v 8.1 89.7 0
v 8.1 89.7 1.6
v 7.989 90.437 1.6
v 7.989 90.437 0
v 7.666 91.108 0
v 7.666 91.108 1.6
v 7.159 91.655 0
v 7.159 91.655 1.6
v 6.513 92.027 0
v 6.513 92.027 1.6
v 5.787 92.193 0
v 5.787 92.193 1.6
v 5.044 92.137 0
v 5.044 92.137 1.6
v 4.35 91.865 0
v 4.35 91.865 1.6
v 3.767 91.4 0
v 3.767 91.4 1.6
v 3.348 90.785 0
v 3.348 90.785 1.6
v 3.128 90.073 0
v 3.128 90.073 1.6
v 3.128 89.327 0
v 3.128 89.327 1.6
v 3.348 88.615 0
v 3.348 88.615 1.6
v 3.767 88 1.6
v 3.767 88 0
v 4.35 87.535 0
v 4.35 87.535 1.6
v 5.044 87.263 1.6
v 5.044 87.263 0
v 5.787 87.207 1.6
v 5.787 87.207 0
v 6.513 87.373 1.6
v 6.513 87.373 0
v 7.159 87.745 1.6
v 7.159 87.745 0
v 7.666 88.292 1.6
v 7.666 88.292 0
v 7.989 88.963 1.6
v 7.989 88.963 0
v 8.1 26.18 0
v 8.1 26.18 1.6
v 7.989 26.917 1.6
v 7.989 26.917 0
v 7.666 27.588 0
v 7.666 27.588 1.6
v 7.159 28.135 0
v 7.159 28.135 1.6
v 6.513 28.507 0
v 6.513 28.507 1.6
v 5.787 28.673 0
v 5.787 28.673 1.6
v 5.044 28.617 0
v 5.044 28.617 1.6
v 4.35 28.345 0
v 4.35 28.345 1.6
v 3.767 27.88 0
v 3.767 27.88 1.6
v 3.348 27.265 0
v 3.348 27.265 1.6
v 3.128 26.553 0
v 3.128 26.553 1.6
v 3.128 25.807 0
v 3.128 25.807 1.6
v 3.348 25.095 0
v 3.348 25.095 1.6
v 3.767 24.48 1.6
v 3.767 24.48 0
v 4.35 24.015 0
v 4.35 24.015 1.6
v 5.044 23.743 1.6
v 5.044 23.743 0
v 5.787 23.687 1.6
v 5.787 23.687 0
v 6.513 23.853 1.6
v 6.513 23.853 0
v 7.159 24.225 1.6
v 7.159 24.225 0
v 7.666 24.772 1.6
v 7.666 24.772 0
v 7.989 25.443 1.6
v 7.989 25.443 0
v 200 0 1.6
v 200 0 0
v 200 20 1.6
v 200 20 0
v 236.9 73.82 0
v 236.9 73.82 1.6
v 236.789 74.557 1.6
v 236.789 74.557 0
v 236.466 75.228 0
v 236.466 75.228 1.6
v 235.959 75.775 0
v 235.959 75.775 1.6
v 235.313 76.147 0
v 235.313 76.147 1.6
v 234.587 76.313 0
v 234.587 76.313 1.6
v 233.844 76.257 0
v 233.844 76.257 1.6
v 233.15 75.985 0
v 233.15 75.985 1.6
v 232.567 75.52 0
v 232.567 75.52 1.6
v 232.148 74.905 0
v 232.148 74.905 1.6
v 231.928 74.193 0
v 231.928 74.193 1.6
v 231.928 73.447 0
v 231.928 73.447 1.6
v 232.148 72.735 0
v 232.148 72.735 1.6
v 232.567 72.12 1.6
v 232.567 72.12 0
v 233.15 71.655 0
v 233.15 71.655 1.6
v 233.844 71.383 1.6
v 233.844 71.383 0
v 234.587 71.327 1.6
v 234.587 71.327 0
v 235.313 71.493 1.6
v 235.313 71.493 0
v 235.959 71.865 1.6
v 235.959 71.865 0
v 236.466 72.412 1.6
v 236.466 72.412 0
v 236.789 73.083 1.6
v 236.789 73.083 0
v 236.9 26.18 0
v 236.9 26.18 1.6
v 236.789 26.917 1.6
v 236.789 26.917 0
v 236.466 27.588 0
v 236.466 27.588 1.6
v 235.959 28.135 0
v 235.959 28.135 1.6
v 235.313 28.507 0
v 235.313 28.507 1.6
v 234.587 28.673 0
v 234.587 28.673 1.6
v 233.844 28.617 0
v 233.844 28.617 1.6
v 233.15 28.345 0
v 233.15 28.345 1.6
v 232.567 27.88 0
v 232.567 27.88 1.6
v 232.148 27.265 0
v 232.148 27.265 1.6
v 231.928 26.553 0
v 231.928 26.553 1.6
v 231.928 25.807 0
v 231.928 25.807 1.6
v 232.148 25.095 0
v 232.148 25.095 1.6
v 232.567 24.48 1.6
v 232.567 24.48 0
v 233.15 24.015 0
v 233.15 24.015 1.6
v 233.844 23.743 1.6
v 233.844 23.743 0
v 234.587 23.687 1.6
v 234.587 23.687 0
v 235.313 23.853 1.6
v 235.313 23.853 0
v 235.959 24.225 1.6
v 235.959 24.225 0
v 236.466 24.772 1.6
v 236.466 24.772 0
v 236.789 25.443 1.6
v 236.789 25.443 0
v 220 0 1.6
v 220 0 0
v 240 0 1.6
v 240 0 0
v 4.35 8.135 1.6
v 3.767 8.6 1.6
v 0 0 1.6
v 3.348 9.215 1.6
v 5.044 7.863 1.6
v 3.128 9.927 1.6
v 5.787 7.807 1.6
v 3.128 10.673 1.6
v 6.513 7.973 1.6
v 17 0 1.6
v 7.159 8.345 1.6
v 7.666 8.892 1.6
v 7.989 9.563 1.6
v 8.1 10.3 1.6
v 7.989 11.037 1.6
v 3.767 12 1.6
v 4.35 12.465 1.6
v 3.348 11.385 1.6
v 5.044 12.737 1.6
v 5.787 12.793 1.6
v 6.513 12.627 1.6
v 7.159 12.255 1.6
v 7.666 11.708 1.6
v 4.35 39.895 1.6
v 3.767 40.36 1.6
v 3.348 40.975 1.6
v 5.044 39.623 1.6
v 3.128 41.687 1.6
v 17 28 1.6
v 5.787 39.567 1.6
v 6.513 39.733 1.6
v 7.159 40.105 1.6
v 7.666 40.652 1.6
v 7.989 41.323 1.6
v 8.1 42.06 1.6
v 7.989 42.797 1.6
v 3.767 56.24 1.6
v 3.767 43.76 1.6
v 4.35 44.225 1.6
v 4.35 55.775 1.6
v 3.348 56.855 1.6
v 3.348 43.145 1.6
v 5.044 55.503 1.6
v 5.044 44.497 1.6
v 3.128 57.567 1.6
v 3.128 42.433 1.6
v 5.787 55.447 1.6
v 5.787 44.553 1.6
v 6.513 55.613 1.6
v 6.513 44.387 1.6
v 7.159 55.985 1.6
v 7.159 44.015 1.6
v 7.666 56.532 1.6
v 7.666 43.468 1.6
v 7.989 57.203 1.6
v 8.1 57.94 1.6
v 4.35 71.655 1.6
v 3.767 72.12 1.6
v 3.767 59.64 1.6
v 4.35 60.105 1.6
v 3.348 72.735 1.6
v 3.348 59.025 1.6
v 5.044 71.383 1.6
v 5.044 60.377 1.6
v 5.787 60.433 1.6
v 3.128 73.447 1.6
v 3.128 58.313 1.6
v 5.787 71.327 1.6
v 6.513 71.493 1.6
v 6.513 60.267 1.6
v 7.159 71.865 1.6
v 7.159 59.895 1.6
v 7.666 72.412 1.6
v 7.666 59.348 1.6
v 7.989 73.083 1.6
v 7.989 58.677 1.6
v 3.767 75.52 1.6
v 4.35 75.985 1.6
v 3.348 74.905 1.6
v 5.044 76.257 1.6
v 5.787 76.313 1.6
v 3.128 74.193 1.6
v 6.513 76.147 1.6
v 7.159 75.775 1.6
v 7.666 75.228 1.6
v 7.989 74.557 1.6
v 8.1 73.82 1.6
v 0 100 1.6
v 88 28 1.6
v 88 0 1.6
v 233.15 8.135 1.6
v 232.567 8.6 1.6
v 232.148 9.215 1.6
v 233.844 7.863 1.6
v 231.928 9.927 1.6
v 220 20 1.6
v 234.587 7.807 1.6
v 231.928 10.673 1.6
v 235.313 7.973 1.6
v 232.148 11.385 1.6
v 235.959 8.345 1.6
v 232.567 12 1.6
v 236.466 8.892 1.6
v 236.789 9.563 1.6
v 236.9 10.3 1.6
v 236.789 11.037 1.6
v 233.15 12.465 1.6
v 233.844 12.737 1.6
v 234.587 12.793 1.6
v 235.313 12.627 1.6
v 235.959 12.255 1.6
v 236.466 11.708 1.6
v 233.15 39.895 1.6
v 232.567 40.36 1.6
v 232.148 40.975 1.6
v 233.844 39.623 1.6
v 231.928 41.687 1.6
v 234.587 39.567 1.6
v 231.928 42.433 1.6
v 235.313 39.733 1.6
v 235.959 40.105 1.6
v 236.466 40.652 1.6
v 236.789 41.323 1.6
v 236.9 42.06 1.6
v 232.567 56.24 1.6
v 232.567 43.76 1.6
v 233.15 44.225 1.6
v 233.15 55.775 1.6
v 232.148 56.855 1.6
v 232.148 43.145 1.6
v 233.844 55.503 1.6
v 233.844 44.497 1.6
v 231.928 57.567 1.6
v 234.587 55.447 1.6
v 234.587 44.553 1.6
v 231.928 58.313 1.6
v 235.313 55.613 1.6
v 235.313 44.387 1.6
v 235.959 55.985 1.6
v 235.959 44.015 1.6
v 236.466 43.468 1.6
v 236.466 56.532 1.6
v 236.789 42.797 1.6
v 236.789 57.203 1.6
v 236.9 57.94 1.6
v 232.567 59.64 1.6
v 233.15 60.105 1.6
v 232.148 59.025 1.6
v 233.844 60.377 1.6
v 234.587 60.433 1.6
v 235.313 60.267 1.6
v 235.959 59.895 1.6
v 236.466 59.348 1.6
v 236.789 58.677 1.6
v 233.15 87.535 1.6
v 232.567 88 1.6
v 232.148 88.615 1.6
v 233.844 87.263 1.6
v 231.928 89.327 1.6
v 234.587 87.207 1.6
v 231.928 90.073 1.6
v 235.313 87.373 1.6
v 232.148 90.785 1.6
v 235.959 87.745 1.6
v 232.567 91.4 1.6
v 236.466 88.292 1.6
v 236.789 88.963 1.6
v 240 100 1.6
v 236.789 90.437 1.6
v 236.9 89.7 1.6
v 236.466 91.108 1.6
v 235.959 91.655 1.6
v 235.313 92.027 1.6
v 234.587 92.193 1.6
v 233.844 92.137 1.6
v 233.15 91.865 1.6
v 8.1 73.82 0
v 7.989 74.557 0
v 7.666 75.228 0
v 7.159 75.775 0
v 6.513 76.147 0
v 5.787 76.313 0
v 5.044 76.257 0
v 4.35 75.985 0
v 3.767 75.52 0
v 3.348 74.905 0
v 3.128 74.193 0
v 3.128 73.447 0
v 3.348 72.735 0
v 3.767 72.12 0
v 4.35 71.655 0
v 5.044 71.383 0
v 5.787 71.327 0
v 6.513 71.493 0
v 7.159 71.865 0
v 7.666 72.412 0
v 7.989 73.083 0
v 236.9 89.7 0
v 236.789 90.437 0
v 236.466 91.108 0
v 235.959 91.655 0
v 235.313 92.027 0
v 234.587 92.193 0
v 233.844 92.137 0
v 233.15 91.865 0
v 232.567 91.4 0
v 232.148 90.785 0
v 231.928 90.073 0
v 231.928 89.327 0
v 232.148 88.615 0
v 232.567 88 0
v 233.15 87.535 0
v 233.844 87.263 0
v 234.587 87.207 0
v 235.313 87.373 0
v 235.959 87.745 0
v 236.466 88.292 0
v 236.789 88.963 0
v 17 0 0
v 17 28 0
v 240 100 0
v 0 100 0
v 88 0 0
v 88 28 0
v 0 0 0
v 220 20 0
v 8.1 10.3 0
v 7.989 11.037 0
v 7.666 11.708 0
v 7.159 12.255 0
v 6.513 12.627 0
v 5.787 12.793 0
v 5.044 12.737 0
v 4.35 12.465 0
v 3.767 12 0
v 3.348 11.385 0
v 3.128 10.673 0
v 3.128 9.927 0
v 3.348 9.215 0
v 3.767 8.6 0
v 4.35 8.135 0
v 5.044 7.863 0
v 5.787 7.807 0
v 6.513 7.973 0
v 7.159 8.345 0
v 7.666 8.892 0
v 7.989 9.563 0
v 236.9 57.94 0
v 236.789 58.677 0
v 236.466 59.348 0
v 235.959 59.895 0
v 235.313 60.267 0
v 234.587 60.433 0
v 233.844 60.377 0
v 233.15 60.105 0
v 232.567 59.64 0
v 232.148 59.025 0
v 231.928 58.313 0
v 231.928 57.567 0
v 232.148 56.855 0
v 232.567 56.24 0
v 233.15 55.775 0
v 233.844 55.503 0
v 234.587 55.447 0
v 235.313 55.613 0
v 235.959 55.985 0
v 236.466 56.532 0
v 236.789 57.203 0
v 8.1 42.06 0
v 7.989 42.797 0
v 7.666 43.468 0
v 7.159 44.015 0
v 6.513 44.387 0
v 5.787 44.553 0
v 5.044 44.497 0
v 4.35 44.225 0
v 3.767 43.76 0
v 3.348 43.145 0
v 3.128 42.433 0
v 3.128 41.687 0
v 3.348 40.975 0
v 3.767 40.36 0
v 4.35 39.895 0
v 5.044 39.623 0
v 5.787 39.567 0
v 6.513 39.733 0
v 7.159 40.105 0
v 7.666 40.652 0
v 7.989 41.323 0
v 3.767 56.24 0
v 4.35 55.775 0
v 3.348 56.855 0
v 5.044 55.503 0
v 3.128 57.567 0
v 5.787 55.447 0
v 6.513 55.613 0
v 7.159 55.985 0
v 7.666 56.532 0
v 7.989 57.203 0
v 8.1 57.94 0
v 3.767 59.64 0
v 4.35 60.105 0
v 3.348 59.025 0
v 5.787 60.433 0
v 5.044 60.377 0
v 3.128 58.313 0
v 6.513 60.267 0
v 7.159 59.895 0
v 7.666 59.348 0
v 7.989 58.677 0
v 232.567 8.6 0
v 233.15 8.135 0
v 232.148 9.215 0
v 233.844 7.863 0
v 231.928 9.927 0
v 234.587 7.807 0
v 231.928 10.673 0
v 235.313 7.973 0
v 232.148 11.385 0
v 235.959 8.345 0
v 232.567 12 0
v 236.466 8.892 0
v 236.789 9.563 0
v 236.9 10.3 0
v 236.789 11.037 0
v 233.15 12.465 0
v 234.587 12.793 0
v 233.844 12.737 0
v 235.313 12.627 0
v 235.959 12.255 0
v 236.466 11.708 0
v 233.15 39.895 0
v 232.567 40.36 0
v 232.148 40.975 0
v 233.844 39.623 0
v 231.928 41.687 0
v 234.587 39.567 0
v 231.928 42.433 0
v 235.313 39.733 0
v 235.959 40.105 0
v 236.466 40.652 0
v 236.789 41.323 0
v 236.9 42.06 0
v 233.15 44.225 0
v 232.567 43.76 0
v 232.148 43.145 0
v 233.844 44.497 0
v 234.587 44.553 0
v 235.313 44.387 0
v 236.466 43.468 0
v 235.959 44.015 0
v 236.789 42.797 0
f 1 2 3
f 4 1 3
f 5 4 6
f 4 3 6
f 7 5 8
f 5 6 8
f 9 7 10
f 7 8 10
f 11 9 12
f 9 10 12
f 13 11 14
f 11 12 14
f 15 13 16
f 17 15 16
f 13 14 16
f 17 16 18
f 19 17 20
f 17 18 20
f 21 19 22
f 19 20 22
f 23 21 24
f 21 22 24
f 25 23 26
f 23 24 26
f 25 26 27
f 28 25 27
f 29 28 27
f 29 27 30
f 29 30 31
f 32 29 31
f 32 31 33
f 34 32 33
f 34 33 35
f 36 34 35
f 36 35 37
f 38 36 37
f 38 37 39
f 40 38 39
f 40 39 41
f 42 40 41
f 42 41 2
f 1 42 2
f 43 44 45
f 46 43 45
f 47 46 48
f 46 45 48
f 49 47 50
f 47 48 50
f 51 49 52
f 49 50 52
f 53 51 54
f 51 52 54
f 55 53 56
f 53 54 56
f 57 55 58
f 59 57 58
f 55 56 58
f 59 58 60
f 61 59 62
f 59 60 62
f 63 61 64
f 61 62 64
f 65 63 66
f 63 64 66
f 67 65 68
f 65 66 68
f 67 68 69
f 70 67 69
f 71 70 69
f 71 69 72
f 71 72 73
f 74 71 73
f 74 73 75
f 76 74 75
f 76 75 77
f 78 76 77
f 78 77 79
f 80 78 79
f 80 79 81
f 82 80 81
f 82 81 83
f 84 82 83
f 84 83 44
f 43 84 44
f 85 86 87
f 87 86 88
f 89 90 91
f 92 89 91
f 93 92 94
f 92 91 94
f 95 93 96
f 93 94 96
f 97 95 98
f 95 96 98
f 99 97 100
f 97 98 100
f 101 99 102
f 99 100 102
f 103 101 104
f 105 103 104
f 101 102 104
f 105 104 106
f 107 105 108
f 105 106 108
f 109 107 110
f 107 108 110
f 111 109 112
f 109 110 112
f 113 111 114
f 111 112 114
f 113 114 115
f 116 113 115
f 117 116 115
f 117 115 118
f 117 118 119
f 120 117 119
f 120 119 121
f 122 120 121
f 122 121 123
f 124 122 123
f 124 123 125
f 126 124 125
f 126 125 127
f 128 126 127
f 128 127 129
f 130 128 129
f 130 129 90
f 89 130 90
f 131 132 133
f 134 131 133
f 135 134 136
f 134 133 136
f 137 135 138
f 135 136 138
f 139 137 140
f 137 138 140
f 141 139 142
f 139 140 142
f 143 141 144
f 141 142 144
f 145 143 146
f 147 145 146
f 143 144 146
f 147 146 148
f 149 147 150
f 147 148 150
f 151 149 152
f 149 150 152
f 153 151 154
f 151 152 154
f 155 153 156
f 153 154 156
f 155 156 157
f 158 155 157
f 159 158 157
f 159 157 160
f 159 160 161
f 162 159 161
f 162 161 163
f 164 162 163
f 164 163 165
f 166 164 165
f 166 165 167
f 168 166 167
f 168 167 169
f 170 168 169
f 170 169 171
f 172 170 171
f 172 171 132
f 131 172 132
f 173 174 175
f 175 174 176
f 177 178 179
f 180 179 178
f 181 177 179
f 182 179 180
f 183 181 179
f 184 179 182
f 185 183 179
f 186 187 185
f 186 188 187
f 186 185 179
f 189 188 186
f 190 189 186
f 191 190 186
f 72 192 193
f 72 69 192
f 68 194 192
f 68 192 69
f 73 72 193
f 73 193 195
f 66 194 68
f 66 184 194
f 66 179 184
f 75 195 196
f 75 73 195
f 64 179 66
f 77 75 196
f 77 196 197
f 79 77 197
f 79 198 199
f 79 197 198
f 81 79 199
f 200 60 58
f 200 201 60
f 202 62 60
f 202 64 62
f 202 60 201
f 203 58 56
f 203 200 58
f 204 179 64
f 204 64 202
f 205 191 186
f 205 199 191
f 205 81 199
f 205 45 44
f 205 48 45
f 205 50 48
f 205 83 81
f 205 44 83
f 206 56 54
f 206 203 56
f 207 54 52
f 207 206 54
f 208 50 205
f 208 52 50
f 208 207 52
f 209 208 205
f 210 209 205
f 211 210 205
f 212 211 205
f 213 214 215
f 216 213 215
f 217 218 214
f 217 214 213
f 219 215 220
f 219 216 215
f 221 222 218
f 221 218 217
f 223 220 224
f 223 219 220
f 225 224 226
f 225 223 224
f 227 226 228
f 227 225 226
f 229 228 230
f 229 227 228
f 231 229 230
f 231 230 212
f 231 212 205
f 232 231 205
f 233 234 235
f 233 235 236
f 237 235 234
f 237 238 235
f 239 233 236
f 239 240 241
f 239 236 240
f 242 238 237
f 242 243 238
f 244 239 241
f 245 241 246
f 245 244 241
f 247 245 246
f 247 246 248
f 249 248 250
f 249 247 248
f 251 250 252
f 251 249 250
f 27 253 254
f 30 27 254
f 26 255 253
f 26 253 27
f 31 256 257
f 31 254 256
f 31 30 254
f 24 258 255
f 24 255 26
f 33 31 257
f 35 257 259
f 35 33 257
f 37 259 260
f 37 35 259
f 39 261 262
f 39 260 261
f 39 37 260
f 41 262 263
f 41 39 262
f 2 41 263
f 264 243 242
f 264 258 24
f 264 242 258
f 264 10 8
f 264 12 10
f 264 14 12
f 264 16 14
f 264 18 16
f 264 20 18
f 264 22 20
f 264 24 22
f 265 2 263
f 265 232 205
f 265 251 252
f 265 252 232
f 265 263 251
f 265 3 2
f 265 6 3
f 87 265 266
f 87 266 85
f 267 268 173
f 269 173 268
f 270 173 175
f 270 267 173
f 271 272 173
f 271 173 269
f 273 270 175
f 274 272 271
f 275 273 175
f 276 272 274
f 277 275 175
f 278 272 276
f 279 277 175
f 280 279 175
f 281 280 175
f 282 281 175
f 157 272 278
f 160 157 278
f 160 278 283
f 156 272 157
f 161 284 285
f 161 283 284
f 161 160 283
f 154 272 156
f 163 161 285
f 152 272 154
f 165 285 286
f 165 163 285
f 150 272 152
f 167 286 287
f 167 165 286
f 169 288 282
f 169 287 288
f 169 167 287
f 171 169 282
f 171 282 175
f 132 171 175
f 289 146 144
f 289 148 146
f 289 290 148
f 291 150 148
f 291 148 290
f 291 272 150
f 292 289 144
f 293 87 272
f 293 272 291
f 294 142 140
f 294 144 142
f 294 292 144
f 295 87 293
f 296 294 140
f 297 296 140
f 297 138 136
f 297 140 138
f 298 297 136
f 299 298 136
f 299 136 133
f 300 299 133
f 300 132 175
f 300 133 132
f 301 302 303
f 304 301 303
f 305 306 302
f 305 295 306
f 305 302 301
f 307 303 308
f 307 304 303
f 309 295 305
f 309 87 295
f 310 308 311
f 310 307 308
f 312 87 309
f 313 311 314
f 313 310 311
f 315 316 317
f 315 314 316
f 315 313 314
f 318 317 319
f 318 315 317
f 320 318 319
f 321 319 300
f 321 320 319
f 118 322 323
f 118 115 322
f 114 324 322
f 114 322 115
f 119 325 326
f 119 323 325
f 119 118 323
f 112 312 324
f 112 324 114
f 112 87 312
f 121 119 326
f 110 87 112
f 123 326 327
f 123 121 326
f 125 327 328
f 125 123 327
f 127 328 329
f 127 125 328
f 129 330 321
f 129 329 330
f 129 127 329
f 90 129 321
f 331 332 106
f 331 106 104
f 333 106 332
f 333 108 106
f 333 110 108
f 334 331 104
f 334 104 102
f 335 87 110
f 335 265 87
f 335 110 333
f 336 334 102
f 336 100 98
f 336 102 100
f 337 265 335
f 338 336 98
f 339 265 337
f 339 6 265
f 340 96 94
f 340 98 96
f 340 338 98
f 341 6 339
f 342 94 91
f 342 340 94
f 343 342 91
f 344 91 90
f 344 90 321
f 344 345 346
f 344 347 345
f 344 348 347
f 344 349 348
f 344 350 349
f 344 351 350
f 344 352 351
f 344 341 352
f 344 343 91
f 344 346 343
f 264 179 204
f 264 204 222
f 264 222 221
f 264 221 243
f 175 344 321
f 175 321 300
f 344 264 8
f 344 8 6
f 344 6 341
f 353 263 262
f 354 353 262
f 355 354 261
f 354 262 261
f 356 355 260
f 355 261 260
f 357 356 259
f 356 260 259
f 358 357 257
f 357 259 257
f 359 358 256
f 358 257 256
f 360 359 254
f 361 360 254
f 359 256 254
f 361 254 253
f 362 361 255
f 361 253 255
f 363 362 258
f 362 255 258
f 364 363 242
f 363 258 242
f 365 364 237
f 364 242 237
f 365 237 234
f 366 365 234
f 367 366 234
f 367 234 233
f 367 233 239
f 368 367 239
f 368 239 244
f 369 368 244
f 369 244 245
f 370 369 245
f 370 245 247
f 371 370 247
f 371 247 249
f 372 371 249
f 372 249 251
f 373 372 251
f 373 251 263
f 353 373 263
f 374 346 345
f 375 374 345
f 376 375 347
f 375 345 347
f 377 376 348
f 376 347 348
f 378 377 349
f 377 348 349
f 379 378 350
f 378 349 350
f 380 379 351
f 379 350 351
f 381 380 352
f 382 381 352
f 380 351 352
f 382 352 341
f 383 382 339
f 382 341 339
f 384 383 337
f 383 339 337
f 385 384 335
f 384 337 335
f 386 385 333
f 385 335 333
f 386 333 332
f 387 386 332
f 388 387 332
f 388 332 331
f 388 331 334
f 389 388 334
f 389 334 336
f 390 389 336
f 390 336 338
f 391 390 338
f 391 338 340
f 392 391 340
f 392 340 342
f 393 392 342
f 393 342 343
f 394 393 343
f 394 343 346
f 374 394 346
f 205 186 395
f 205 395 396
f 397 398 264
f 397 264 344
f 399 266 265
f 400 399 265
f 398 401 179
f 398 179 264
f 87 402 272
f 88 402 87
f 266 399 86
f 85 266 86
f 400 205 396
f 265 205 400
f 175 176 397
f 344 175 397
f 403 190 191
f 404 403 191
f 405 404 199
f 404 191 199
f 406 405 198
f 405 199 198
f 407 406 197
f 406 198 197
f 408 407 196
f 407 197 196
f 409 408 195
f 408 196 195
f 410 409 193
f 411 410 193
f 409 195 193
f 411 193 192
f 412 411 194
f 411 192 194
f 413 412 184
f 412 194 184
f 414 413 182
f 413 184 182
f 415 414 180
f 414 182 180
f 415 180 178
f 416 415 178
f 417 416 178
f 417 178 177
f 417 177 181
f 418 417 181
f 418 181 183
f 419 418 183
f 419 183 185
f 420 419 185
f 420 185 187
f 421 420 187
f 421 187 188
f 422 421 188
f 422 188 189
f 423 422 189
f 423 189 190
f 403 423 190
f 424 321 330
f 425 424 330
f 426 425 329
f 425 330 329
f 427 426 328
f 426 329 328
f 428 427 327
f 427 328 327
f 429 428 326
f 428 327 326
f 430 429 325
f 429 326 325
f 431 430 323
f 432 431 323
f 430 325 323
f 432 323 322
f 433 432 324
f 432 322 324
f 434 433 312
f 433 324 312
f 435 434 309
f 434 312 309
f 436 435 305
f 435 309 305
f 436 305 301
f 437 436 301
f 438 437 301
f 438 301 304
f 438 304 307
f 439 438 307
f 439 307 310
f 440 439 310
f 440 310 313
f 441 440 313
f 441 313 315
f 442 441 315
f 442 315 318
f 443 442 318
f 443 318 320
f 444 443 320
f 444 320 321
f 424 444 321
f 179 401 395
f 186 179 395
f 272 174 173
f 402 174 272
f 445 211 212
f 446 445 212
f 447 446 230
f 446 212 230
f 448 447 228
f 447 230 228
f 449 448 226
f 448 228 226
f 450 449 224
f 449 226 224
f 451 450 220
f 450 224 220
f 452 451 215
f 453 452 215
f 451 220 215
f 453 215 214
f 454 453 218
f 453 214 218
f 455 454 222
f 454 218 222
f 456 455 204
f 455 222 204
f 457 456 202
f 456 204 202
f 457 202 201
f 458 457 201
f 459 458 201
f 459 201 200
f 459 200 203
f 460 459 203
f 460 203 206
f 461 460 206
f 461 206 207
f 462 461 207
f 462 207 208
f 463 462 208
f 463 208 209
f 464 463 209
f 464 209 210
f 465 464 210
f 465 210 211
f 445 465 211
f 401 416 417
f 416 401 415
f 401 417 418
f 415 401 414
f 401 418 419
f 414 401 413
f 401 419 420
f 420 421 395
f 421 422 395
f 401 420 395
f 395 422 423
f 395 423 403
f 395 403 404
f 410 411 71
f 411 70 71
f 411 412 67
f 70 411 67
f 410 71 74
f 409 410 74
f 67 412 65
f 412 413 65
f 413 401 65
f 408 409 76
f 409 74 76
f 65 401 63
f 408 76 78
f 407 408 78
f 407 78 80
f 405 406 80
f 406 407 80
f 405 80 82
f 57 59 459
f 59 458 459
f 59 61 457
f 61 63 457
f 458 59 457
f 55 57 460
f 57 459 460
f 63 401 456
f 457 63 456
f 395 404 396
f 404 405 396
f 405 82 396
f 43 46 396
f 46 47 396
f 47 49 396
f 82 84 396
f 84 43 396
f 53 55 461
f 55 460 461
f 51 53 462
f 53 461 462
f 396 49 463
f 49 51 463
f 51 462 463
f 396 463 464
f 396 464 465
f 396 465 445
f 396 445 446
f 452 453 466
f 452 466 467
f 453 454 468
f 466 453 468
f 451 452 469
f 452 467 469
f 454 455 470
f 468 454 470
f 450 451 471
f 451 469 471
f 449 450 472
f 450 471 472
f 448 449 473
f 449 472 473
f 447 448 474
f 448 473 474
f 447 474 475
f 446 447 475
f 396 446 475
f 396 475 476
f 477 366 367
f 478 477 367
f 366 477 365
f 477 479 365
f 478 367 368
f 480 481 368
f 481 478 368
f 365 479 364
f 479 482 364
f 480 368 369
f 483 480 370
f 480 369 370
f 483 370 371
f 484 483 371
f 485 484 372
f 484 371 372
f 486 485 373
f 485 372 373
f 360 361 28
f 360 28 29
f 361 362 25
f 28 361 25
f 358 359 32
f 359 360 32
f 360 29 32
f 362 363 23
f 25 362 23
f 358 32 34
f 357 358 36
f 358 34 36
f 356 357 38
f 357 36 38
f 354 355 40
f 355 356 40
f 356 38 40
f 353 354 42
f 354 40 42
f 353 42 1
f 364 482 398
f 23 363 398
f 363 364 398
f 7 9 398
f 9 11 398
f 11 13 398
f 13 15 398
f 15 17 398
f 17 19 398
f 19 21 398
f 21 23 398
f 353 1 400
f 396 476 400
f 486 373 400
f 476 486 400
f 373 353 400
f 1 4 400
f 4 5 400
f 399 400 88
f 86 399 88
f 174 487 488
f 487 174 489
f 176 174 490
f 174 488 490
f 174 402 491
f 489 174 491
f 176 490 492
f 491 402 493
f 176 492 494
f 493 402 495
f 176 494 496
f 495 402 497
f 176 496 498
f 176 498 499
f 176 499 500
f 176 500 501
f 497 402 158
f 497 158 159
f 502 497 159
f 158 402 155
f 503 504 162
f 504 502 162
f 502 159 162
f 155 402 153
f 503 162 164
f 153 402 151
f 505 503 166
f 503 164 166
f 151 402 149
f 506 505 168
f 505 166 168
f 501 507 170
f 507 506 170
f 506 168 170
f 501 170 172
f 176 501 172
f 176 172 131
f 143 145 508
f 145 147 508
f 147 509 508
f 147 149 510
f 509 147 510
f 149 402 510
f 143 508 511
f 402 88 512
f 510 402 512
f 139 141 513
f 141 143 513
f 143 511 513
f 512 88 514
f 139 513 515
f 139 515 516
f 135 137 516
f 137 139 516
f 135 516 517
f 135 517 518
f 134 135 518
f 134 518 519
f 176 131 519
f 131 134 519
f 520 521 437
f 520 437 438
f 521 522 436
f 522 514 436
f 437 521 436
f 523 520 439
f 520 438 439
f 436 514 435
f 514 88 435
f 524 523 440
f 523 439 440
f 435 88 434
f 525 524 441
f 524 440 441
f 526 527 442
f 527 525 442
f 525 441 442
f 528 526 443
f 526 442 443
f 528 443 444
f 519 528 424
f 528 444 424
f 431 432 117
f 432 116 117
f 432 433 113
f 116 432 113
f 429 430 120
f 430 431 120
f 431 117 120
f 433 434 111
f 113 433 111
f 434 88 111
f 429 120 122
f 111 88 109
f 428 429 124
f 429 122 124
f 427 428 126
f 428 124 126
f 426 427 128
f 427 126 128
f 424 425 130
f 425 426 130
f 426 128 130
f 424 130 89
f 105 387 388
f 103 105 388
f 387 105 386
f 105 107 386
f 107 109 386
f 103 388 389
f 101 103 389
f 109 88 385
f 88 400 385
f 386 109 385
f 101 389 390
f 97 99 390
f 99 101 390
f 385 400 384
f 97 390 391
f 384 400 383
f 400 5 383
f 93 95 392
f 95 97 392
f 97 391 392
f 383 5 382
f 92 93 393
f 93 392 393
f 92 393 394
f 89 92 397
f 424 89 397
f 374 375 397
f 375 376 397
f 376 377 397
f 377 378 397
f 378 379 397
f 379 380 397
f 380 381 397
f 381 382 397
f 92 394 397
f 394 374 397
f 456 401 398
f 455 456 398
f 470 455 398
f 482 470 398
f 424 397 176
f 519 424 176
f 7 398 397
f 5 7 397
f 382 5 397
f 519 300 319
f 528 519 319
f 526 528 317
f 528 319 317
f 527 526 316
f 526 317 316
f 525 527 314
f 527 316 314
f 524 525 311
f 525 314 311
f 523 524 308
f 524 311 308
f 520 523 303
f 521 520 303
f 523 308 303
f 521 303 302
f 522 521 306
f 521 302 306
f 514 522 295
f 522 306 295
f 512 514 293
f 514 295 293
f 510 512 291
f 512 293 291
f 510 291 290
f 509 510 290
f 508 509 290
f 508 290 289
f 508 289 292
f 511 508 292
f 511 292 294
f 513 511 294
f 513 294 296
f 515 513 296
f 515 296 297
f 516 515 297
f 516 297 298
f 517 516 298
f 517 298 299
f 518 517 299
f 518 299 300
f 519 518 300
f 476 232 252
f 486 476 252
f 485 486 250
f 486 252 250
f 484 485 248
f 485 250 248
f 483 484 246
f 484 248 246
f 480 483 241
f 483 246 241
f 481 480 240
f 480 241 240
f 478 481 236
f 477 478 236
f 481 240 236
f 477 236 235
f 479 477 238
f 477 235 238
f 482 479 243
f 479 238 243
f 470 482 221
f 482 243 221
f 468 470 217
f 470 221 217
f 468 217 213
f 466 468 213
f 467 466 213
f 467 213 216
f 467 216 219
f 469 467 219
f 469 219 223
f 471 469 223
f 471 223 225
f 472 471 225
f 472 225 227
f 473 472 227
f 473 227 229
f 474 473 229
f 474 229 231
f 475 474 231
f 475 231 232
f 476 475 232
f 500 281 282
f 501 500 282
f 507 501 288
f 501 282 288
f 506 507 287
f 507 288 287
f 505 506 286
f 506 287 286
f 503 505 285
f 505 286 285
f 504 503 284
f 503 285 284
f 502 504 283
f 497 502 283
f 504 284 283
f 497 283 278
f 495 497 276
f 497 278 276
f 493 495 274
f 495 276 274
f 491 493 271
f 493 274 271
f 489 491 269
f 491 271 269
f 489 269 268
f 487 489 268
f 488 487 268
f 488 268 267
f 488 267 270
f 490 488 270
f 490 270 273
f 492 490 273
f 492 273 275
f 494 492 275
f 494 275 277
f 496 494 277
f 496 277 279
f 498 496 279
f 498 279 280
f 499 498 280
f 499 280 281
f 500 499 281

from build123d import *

# Parameters (mm, degrees)
SKETCH1_W           = 240
SKETCH1_H           = 100
BOSS_EXTRUDE1_DEPTH = 1.6
CUT_EXTRUDE1_REACH  = 262.005
SKETCH2_R           = 2.5
LPATTERN1_COUNT     = 6
LPATTERN1_PITCH     = 15.88
CUT_EXTRUDE2_REACH  = 262.005
SKETCH3_W           = 71
SKETCH3_H           = 28
CUT_EXTRUDE3_REACH  = 262.005
SKETCH4_W           = 20
SKETCH4_H           = 20


with BuildPart() as part:
    # Sketch1 → Boss-Extrude1 (new body)
    with BuildSketch(Plane.XY):
        with Locations((120, 50)):
            Rectangle(SKETCH1_W, SKETCH1_H)
    extrude(amount=BOSS_EXTRUDE1_DEPTH)

    # Sketch2 → Cut-Extrude1 (cut, up to next)
    with BuildSketch(Plane.XY.offset(1.6), mode=Mode.PRIVATE) as cut_extrude1_sk1:
        with Locations((5.6, 10.3)):
            Circle(SKETCH2_R)
    cut_extrude1_tool1 = extrude(cut_extrude1_sk1.sketch, amount=-CUT_EXTRUDE1_REACH, mode=Mode.PRIVATE) & part.part
    # Sketch2 → Cut-Extrude1 (cut, up to next)
    with BuildSketch(Plane.XY.offset(1.6), mode=Mode.PRIVATE) as cut_extrude1_sk2:
        with Locations((234.4, 10.3)):
            Circle(SKETCH2_R)
    cut_extrude1_tool2 = extrude(cut_extrude1_sk2.sketch, amount=-CUT_EXTRUDE1_REACH, mode=Mode.PRIVATE) & part.part
    cut_extrude1_1 = cut_extrude1_tool1.solids().sort_by_distance((5.6, 10.3, 1.6))[0]
    add(cut_extrude1_1, mode=Mode.SUBTRACT)
    cut_extrude1_2 = cut_extrude1_tool2.solids().sort_by_distance((234.4, 10.3, 1.6))[0]
    add(cut_extrude1_2, mode=Mode.SUBTRACT)
    cut_extrude1 = cut_extrude1_1 + cut_extrude1_2  # Cut-Extrude1 as one shape, for the pattern or mirror that repeats it

    # LPattern1: Cut-Extrude1 ×6
    with Locations(*[(0, i * LPATTERN1_PITCH, 0) for i in range(1, LPATTERN1_COUNT)]):
        add(cut_extrude1, mode=Mode.SUBTRACT)

    # Sketch3 → Cut-Extrude2 (cut, up to next)
    with BuildSketch(Plane.XY.offset(1.6), mode=Mode.PRIVATE) as cut_extrude2_sk1:
        with Locations((52.5, 14)):
            Rectangle(SKETCH3_W, SKETCH3_H)
    cut_extrude2_tool1 = extrude(cut_extrude2_sk1.sketch, amount=-CUT_EXTRUDE2_REACH, mode=Mode.PRIVATE) & part.part
    add(cut_extrude2_tool1.solids().sort_by_distance((52.5, 14, 1.6))[0], mode=Mode.SUBTRACT)

    # Sketch4 → Cut-Extrude3 (cut, up to next)
    with BuildSketch(Plane(origin=(0, 0, 0), x_dir=(-1, 0, 0), z_dir=(0, 0, -1)), mode=Mode.PRIVATE) as cut_extrude3_sk1:
        with Locations((-210, 10)):
            Rectangle(SKETCH4_W, SKETCH4_H)
    cut_extrude3_tool1 = extrude(cut_extrude3_sk1.sketch, amount=-CUT_EXTRUDE3_REACH, mode=Mode.PRIVATE) & part.part
    add(cut_extrude3_tool1.solids().sort_by_distance((210, 10, 0))[0], mode=Mode.SUBTRACT)


solid = part.part
